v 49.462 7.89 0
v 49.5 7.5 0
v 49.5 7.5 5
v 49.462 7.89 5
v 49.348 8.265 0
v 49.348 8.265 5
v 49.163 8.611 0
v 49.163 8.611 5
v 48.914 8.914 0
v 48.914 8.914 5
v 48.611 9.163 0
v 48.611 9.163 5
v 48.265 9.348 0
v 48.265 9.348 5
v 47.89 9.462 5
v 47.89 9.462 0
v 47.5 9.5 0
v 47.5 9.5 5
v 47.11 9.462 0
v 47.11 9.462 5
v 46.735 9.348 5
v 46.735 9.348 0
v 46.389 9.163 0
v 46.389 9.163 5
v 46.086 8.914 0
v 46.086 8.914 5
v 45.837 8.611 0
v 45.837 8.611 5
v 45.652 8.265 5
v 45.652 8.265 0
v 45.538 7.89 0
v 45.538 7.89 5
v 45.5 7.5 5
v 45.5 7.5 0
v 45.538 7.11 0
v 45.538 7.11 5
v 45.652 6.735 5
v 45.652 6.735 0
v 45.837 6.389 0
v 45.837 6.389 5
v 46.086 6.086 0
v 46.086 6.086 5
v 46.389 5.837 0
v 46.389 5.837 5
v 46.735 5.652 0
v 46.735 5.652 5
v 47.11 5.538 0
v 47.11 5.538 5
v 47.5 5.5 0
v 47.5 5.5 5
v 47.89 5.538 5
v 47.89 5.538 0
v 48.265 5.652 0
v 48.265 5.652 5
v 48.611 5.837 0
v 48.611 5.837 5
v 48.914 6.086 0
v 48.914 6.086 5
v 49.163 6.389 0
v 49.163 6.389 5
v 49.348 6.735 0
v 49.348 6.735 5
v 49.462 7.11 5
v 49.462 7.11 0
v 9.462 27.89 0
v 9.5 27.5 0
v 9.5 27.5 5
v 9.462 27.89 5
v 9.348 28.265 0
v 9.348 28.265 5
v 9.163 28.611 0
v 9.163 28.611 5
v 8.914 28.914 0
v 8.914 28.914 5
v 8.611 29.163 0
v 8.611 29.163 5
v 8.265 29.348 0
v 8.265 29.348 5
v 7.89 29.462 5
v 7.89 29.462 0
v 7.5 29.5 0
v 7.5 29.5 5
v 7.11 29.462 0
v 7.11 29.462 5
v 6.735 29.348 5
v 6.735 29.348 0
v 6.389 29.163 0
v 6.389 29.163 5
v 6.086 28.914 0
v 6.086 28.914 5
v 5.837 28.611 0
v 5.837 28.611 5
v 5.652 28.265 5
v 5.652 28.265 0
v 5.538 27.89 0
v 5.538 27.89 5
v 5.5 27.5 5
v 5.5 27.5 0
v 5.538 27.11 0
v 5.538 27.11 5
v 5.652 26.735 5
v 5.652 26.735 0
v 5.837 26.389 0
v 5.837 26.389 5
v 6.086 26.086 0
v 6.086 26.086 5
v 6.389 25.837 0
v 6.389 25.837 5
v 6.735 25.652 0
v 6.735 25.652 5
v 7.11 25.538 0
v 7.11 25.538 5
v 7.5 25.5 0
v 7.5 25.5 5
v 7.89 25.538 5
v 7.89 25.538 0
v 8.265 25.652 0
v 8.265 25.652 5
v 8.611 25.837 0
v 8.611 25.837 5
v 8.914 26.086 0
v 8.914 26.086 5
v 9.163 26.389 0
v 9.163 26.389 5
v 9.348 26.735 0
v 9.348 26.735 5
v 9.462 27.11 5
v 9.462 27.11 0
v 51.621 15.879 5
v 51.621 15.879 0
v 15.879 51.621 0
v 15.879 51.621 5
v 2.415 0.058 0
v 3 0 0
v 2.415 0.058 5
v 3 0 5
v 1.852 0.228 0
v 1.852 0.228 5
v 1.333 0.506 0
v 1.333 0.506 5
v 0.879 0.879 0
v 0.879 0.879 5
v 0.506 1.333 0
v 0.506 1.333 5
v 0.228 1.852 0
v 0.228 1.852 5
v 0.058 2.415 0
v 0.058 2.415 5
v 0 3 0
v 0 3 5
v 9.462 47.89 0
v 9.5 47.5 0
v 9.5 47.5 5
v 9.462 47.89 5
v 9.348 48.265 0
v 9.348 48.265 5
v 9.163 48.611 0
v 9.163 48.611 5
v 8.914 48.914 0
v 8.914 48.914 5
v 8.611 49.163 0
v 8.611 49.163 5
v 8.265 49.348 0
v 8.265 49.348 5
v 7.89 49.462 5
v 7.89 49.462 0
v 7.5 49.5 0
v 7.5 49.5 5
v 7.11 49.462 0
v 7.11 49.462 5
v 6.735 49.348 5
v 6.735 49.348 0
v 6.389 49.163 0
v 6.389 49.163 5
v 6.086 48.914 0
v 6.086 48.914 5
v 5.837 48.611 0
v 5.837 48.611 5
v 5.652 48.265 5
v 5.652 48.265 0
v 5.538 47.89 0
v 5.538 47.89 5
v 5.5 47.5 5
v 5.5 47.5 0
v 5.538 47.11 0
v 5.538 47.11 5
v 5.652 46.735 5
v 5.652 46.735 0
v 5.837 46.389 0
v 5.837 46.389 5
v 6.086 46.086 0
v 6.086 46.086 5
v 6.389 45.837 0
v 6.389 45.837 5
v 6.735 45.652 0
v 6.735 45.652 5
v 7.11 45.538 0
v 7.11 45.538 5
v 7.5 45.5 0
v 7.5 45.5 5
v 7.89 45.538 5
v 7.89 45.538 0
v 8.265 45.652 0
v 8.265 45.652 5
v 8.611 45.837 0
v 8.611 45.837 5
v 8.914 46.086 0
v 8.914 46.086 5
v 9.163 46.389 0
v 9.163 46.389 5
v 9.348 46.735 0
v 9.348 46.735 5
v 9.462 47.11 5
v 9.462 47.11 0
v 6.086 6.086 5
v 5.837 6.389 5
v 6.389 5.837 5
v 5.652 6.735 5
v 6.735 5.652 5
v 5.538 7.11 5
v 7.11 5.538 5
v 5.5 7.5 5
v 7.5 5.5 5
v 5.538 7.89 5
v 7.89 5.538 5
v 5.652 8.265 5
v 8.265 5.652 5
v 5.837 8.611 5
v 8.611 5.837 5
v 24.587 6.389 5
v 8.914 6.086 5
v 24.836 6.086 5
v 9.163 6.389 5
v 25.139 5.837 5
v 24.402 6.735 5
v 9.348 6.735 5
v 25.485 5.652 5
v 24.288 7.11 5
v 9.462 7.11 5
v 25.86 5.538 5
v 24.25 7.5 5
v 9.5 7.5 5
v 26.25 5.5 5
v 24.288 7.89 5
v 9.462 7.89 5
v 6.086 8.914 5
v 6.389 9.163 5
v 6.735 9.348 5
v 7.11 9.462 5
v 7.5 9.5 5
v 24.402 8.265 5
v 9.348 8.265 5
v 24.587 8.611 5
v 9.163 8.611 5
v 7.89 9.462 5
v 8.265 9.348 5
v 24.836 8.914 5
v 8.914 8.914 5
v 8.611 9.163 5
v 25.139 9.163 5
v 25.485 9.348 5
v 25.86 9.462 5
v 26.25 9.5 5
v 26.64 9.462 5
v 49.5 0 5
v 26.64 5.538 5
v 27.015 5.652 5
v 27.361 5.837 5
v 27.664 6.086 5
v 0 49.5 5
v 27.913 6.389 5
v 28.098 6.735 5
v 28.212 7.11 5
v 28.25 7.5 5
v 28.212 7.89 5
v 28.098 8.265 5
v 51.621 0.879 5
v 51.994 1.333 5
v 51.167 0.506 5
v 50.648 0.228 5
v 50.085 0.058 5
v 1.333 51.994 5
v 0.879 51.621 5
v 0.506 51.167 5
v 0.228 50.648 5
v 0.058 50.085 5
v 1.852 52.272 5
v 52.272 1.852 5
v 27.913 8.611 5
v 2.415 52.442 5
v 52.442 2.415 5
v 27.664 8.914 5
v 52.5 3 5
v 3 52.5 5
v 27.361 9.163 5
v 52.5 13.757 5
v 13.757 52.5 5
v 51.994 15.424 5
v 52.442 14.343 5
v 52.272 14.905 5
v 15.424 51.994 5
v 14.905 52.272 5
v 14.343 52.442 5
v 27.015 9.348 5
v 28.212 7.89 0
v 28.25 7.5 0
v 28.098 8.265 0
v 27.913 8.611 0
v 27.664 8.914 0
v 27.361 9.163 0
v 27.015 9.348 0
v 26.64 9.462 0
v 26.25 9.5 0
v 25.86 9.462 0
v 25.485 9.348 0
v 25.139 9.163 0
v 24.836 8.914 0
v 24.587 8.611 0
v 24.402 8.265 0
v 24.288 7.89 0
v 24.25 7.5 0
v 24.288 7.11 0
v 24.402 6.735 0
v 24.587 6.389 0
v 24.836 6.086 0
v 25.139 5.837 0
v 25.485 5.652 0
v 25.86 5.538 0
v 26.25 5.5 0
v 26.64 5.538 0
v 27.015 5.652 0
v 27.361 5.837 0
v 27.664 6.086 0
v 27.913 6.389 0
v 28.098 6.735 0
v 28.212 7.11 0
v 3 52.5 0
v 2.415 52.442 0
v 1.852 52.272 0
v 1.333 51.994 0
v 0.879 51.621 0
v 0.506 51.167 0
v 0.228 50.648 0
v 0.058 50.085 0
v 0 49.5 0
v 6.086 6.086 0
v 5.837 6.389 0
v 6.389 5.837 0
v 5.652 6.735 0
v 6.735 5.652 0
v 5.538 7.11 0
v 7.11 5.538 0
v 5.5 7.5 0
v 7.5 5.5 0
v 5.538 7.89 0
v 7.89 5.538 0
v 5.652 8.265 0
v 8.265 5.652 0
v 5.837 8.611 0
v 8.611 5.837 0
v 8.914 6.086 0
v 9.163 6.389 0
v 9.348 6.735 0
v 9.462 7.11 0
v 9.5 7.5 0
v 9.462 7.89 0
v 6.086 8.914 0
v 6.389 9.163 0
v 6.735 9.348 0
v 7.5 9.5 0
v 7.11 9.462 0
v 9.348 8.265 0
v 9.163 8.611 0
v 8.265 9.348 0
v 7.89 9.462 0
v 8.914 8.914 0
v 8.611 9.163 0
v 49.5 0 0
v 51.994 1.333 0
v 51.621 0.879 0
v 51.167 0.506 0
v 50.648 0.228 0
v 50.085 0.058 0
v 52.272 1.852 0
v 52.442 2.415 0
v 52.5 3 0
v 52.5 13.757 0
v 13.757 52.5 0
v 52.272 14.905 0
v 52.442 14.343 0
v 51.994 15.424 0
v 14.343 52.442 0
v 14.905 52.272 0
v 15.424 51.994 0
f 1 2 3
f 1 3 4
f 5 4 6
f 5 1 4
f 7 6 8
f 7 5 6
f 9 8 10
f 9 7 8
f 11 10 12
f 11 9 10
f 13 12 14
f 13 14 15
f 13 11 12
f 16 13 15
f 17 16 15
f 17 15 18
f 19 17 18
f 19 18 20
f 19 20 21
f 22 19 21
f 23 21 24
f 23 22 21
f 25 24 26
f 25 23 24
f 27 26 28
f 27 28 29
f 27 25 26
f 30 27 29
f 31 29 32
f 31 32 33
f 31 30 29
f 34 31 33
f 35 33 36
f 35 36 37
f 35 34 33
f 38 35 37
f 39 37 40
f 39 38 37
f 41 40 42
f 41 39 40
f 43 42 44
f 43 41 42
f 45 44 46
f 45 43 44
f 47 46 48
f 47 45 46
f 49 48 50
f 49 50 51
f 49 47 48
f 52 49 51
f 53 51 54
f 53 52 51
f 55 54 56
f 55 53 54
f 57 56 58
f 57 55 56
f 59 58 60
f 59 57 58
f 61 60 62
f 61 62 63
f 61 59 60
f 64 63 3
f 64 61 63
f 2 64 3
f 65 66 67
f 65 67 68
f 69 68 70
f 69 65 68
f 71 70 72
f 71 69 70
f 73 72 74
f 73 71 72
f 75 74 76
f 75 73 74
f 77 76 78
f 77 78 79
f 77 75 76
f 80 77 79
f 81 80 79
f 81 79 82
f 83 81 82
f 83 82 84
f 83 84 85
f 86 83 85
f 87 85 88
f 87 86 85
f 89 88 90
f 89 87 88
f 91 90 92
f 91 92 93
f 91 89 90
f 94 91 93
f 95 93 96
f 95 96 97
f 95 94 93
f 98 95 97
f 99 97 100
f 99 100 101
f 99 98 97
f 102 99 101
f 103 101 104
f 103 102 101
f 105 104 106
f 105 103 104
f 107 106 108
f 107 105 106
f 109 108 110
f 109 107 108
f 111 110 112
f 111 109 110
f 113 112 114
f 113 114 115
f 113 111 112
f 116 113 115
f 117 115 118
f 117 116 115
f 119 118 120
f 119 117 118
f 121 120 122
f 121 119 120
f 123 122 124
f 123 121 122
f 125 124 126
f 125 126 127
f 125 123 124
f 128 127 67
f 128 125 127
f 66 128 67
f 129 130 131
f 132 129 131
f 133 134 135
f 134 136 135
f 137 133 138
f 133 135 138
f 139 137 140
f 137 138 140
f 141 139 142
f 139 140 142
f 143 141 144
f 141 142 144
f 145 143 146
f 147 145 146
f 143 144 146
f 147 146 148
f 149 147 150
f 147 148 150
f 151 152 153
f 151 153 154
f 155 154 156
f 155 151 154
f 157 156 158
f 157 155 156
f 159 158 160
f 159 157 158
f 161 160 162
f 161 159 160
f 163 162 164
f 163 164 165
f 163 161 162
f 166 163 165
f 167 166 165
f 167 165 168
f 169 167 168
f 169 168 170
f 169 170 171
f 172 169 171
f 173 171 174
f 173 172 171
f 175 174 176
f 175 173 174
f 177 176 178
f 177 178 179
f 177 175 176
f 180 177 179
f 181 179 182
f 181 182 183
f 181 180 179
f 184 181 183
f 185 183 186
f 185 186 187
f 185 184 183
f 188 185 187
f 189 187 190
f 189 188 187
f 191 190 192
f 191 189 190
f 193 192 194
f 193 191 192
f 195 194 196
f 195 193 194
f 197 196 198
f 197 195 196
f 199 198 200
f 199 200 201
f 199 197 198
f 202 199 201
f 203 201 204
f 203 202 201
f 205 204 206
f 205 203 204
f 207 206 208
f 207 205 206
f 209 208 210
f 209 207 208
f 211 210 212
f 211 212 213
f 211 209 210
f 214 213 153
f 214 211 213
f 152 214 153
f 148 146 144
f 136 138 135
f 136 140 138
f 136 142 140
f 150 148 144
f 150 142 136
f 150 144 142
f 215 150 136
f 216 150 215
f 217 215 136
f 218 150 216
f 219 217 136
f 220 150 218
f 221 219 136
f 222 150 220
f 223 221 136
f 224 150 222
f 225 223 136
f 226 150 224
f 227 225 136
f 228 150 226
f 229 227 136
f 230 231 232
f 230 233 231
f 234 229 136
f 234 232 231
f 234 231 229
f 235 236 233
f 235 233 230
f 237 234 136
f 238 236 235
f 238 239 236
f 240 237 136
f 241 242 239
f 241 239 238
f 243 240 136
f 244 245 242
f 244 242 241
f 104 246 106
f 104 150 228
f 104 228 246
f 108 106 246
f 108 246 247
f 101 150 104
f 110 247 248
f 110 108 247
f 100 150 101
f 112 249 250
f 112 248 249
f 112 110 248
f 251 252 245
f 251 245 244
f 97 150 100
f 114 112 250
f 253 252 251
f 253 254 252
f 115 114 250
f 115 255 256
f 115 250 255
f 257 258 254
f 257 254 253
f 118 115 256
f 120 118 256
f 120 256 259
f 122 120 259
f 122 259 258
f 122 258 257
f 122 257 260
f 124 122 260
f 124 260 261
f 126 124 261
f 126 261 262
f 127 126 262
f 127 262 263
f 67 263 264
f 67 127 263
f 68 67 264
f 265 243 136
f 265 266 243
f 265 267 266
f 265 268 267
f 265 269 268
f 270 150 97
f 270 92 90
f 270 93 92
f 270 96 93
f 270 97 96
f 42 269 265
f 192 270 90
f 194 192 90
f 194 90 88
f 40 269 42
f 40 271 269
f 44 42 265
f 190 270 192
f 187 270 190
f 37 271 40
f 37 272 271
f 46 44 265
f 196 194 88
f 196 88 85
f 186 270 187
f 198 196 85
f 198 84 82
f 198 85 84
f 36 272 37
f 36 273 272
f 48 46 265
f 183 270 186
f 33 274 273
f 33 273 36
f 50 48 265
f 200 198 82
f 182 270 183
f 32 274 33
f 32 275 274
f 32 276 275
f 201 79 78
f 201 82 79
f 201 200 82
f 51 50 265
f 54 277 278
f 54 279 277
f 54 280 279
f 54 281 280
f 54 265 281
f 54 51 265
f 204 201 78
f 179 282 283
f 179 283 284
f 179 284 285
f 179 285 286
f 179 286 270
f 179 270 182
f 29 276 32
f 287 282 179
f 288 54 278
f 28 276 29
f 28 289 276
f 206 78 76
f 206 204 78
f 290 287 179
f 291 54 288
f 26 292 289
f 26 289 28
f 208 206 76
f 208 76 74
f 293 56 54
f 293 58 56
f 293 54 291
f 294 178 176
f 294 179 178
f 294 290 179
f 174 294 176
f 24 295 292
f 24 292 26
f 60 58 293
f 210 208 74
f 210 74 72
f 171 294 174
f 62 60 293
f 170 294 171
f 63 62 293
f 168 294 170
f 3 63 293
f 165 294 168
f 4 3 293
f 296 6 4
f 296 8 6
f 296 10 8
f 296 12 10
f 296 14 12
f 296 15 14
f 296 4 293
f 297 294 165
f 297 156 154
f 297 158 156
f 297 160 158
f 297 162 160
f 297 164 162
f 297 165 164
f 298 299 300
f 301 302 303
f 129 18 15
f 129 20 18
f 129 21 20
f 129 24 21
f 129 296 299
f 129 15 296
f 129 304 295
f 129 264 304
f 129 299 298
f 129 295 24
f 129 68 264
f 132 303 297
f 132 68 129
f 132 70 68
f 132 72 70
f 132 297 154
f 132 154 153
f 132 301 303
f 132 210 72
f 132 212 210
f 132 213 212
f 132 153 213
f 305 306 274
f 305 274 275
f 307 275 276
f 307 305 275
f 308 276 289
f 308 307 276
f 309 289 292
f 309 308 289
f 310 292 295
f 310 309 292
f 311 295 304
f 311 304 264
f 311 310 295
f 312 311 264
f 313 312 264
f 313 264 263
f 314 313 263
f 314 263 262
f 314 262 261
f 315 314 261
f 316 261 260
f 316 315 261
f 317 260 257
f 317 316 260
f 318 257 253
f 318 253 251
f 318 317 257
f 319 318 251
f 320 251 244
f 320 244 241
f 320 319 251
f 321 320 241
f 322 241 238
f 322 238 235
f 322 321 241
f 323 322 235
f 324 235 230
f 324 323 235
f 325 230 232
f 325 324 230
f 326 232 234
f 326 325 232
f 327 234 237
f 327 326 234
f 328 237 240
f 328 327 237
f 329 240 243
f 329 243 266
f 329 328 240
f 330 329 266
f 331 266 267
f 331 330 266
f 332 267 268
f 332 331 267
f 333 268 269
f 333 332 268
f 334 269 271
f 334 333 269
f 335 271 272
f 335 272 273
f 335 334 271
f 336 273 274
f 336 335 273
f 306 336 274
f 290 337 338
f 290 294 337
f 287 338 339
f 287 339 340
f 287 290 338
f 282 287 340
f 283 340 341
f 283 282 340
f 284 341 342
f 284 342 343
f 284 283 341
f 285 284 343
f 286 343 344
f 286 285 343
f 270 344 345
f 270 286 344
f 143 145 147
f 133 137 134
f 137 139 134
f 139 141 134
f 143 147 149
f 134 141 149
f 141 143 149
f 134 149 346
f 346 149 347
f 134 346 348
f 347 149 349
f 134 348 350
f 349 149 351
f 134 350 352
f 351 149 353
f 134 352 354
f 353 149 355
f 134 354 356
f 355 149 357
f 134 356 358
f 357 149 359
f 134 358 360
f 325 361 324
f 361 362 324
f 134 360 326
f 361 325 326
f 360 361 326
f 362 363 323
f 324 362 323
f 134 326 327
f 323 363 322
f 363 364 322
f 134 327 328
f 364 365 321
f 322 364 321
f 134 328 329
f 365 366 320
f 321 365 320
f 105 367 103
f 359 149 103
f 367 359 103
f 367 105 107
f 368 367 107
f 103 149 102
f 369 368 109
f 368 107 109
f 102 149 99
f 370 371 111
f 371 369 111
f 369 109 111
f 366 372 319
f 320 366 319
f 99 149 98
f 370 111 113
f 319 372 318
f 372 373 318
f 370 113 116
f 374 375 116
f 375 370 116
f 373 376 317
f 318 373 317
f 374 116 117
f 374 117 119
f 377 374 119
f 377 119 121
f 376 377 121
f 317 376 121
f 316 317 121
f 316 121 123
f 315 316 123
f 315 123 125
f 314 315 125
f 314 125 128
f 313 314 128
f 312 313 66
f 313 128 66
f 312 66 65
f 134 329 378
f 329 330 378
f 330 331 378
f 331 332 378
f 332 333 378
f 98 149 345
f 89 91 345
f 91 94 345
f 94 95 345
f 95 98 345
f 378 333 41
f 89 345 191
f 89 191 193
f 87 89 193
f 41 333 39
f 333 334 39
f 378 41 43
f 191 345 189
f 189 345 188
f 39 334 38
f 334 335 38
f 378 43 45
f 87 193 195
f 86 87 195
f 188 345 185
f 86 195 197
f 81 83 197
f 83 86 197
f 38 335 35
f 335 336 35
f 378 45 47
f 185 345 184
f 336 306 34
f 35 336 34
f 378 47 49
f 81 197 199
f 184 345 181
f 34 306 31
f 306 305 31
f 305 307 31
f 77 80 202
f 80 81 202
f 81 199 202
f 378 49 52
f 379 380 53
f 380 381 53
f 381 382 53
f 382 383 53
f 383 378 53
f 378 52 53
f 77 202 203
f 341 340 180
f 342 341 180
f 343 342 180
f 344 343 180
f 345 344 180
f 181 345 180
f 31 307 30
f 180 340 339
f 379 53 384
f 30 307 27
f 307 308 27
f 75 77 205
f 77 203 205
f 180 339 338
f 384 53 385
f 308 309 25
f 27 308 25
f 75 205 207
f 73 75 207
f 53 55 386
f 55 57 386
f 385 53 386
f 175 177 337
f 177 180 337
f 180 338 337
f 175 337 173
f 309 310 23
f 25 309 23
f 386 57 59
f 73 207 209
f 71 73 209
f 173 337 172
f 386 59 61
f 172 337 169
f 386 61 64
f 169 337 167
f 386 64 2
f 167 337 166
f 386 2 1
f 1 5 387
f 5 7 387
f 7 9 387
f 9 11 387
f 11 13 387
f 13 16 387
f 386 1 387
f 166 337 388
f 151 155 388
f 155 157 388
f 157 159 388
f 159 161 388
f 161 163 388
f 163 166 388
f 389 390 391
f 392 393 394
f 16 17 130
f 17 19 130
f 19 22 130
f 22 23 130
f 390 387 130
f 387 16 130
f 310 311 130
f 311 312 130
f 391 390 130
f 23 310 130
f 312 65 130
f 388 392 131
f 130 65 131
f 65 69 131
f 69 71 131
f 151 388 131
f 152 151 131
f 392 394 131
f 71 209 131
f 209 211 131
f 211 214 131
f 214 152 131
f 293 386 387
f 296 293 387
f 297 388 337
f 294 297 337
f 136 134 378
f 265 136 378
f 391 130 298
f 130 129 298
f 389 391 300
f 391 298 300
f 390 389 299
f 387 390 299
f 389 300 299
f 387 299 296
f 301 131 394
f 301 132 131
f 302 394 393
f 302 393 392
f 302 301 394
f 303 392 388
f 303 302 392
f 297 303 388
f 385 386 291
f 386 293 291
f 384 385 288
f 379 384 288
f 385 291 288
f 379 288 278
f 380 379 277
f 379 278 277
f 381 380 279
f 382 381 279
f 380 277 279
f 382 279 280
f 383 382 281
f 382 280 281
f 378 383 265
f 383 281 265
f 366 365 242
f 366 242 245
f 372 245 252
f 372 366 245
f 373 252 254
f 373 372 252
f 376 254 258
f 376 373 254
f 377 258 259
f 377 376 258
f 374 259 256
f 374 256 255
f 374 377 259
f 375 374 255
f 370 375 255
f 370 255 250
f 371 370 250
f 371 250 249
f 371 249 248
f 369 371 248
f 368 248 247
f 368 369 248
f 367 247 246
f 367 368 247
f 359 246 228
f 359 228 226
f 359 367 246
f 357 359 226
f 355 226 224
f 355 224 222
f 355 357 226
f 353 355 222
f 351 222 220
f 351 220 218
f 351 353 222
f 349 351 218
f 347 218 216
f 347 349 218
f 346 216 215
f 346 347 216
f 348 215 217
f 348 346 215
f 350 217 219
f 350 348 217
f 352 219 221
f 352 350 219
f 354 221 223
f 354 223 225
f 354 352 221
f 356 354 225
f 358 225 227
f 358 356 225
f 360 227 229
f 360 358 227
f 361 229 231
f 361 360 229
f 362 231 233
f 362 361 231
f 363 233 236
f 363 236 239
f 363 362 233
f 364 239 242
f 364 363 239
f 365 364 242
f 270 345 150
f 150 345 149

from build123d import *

# Parameters (mm, degrees)
SKETCH_1_R      = 2
EXTRUDE_1_DEPTH = 5
FILLET_1_R      = 3


with BuildPart() as part:
    # ｽｹｯﾁ1 → ﾎﾞｽ - 押し出し1 (new body)
    with BuildSketch(Plane.XY):
        Polygon((52.5, 15), (15, 52.5), (0, 52.5), (0, 0), (52.5, 0), align=None)
        with Locations((7.5, 7.5)):
            Circle(SKETCH_1_R, mode=Mode.SUBTRACT)
        with Locations((26.25, 7.5)):
            Circle(SKETCH_1_R, mode=Mode.SUBTRACT)
        with Locations((47.5, 7.5)):
            Circle(SKETCH_1_R, mode=Mode.SUBTRACT)
        with Locations((7.5, 27.5)):
            Circle(SKETCH_1_R, mode=Mode.SUBTRACT)
        with Locations((7.5, 47.5)):
            Circle(SKETCH_1_R, mode=Mode.SUBTRACT)
    extrude(amount=EXTRUDE_1_DEPTH)

    # ﾌｨﾚｯﾄ1
    fillet_1_edges = [part.edges().sort_by_distance(p)[0] for p in [
        (0, 0, 2.5),
        (0, 52.5, 2.5),
        (15, 52.5, 2.5),
        (52.5, 15, 2.5),
        (52.5, 0, 2.5),
    ]]
    fillet(fillet_1_edges, radius=FILLET_1_R)


solid = part.part
